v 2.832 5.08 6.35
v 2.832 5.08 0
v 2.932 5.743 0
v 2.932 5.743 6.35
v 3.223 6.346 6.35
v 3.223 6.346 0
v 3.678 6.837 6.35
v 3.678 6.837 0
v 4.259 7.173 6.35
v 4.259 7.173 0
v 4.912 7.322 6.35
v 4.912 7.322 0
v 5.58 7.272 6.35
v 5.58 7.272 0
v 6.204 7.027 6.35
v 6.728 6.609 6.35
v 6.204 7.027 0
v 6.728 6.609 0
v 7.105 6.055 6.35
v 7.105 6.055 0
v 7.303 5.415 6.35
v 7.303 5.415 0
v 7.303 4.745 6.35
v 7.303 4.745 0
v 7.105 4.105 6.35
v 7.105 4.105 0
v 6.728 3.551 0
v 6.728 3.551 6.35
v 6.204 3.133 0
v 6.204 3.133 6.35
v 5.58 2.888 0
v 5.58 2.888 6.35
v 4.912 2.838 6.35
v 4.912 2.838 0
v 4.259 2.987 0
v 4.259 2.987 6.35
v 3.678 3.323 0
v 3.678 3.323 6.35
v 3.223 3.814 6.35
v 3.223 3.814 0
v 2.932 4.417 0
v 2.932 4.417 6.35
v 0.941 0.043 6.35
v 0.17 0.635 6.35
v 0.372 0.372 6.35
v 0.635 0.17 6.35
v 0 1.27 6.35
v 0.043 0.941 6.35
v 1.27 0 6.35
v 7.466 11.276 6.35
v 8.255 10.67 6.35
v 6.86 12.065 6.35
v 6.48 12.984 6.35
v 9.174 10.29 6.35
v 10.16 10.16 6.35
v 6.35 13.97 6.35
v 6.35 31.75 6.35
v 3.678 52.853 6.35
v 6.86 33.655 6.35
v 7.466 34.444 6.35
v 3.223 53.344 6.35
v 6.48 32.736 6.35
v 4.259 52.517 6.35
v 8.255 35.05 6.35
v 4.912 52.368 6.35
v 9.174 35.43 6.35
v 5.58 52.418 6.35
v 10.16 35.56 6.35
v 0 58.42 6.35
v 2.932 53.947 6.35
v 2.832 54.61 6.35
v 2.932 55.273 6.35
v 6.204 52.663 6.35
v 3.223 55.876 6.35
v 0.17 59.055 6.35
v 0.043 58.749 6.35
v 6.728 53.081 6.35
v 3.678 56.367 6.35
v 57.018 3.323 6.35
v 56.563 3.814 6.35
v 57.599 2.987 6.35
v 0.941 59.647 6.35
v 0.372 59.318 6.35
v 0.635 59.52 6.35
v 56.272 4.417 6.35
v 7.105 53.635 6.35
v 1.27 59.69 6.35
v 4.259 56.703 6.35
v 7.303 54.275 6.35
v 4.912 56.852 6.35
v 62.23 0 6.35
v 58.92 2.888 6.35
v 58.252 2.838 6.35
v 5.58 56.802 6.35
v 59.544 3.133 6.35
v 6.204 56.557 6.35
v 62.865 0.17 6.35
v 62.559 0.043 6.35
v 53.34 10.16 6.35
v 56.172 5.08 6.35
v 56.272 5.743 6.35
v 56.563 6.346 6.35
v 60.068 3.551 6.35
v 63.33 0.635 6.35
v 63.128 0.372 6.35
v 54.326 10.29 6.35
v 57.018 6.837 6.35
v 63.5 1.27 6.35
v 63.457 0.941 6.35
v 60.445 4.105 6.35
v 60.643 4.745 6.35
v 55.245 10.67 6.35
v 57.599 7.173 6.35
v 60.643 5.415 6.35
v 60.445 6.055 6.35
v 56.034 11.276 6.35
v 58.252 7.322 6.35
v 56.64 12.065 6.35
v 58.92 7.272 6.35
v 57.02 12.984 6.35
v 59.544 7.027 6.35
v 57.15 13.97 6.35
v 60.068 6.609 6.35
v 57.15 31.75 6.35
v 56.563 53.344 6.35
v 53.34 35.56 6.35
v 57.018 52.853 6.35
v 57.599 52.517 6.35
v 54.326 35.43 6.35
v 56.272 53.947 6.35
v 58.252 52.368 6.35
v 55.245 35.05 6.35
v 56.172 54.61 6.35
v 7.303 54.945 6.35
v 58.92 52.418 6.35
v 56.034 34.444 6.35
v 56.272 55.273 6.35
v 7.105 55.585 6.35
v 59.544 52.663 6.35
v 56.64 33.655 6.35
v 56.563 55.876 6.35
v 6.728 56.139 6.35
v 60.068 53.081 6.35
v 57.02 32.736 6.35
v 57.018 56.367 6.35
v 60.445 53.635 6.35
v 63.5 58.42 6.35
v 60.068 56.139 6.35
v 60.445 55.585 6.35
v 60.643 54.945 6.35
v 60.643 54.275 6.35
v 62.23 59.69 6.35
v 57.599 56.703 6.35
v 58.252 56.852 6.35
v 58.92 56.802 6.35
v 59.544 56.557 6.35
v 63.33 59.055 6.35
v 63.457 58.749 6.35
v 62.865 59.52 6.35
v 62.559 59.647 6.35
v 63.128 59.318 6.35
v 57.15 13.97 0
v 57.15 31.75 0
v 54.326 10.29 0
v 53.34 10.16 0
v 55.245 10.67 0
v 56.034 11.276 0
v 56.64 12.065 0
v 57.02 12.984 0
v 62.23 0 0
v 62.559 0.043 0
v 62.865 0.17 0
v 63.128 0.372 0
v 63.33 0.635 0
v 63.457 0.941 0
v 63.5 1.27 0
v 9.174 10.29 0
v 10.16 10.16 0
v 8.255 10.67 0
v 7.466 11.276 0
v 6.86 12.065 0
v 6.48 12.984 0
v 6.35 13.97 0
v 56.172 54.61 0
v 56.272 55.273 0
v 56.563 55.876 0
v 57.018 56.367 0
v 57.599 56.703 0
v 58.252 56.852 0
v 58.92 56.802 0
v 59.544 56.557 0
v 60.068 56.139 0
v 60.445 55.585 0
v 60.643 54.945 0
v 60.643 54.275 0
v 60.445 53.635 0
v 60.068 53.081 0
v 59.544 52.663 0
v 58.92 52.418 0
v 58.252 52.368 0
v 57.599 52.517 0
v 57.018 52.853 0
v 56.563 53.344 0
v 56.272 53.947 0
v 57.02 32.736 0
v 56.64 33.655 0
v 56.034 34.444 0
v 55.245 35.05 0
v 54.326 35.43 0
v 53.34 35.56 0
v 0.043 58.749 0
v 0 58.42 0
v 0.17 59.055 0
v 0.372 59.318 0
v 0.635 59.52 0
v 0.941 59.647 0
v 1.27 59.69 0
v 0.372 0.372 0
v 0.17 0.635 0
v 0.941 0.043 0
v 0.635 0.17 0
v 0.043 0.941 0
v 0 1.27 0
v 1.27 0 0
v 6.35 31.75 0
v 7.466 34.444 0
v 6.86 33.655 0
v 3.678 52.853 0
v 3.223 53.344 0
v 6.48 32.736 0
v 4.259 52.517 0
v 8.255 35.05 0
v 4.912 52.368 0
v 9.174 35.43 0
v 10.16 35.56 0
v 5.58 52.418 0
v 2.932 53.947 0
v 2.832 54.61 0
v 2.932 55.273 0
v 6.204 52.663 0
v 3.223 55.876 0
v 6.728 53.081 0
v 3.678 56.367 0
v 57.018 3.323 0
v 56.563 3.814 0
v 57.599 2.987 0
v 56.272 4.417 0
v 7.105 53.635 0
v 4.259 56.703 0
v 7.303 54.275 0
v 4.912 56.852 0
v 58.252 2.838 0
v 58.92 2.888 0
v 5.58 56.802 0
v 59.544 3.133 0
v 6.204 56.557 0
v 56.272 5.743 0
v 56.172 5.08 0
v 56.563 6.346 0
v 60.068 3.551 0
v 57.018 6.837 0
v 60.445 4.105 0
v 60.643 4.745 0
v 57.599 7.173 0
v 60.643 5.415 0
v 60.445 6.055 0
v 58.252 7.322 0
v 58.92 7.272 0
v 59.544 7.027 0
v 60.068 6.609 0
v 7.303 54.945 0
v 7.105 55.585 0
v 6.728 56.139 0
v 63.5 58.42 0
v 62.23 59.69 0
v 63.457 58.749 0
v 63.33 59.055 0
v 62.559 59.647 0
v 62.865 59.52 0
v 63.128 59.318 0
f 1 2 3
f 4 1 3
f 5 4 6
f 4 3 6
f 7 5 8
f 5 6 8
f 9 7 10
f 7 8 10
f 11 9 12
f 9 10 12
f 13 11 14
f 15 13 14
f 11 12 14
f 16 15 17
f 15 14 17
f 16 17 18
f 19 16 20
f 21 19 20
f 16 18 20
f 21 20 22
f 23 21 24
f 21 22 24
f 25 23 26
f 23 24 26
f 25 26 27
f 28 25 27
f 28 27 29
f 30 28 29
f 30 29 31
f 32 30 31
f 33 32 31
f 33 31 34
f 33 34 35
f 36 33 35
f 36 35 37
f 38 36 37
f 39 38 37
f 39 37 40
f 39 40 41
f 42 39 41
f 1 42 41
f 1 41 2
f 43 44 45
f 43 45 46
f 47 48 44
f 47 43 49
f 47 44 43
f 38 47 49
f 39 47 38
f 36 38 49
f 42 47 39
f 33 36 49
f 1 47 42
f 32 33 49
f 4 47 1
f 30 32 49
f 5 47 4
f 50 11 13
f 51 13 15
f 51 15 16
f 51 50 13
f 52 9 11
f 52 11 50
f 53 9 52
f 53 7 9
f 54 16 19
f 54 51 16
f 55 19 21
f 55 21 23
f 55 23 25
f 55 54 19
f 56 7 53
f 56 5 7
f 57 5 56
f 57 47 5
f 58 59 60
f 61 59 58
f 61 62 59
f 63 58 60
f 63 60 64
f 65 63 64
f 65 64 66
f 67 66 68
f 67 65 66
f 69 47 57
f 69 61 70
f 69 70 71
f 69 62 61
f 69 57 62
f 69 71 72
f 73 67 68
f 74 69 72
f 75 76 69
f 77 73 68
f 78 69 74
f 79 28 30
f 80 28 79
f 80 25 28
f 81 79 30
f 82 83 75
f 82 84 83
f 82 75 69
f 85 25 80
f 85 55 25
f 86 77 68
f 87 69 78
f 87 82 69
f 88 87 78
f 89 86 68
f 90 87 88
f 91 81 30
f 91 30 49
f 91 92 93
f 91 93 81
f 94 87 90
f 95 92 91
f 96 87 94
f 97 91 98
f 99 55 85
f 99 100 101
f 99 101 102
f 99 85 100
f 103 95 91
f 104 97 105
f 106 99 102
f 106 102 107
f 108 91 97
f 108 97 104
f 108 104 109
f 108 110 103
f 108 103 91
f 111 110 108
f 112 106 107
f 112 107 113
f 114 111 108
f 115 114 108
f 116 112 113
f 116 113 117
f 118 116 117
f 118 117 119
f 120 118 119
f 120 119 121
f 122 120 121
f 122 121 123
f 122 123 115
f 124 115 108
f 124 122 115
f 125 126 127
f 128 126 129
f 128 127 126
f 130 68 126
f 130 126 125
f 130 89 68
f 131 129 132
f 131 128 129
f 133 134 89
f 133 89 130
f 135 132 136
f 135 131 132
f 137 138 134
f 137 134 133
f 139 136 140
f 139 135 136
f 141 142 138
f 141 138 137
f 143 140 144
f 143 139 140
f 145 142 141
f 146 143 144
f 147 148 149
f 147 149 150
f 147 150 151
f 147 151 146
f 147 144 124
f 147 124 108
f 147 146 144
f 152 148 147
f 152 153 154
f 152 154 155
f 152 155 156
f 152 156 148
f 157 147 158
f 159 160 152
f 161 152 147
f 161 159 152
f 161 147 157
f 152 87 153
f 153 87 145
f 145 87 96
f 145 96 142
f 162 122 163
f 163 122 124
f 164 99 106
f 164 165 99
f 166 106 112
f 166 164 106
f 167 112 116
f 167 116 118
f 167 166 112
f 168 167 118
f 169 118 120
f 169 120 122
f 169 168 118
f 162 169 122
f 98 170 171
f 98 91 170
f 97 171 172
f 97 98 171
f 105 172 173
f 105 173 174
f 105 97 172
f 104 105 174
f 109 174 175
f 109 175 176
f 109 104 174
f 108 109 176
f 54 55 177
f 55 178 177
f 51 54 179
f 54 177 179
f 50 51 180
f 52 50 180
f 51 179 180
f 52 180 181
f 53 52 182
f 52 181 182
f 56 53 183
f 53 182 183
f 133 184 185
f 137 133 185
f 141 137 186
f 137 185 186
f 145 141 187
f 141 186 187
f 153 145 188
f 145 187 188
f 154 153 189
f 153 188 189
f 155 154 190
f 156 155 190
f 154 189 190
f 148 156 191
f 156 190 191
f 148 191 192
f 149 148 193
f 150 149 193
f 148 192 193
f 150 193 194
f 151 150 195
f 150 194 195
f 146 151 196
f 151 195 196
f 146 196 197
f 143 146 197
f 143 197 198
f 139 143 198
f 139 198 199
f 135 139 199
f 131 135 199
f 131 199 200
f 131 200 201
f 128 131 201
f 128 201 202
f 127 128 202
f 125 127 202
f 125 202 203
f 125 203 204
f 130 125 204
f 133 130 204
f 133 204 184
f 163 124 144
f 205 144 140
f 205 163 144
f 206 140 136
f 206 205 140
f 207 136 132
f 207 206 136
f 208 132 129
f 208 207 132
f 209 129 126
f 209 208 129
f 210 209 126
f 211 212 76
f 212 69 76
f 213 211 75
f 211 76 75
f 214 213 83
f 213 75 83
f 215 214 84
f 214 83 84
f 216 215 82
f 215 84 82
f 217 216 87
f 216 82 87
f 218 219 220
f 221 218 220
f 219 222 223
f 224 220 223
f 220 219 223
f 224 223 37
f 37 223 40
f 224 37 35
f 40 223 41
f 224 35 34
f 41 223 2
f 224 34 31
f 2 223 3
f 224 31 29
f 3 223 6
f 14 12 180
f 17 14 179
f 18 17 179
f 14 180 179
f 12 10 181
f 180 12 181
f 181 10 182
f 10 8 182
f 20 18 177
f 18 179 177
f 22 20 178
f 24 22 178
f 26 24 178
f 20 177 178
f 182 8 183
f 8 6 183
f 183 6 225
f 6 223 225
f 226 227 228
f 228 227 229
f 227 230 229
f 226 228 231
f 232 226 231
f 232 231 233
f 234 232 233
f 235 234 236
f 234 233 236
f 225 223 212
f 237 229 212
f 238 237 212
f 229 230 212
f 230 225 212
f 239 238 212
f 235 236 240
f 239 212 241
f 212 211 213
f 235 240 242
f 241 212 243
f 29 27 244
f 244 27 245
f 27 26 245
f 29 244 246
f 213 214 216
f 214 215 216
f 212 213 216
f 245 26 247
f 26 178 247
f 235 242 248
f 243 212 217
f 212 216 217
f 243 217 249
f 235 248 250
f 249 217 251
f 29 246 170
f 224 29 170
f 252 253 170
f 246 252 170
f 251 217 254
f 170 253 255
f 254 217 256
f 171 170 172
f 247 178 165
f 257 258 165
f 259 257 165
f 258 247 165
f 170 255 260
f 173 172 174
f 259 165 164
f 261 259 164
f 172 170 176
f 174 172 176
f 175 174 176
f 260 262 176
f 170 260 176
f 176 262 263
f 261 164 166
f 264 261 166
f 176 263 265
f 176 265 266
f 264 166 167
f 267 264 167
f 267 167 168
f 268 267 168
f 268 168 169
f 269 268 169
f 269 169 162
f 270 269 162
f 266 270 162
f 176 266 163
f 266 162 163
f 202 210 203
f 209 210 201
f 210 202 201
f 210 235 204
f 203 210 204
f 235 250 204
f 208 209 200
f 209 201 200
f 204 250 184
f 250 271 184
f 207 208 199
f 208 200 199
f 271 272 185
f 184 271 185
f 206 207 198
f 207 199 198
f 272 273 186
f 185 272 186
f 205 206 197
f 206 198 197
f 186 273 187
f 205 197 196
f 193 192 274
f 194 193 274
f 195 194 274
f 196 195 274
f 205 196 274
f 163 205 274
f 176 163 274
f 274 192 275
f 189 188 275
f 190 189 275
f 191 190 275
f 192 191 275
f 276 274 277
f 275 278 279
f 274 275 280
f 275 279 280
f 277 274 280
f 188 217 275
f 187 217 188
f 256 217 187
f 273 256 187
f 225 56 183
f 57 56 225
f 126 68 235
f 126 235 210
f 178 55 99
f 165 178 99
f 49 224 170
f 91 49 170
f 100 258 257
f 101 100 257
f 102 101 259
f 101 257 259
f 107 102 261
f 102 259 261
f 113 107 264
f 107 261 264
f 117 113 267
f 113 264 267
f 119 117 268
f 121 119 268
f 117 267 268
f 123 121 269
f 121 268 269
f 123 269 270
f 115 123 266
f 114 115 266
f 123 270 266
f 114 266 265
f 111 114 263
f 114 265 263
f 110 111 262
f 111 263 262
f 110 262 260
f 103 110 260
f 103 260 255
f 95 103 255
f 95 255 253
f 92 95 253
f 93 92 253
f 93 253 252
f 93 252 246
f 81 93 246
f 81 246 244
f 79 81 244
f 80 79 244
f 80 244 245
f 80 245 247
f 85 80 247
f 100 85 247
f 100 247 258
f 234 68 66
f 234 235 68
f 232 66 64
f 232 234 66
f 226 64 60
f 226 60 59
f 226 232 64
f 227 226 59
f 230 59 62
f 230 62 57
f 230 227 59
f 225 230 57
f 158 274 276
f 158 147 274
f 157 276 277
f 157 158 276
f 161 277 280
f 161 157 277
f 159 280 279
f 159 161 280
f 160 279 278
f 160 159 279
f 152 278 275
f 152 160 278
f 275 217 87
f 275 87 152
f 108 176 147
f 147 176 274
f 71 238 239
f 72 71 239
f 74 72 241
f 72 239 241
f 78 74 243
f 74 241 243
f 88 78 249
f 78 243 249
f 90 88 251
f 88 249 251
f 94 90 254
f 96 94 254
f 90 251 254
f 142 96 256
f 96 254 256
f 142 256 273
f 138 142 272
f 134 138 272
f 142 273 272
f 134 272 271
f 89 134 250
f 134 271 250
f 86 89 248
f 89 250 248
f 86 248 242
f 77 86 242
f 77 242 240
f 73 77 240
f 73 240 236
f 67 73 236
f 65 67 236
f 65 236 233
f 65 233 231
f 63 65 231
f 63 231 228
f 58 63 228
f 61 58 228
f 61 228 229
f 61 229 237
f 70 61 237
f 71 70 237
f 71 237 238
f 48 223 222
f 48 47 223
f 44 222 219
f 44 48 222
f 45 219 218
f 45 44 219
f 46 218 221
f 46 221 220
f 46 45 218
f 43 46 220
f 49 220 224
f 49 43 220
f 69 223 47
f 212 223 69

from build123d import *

# Parameters (mm, degrees)
SKETCH1_W             = 63.5
SKETCH1_H             = 59.69
BOSS_EXTRUDE1_DEPTH   = 6.35
FILLET1_R             = 1.27
F_8_CLEARANCE_HOLE1_D = 4.4958
SKETCH7_W             = 50.8
SKETCH7_H             = 25.4
CUT_EXTRUDE1_DEPTH    = 7.35
FILLET2_R             = 3.81


with BuildPart() as part:
    # Sketch1 → Boss-Extrude1 (new body)
    with BuildSketch(Plane.XY):
        with Locations((31.75, 29.845)):
            Rectangle(SKETCH1_W, SKETCH1_H)
    extrude(amount=BOSS_EXTRUDE1_DEPTH)

    # Fillet1
    fillet1_edges = [part.edges().sort_by_distance(p)[0] for p in [
        (0, 59.69, 3.175),
        (63.5, 59.69, 3.175),
        (63.5, 0, 3.175),
        (0, 0, 3.175),
    ]]
    fillet(fillet1_edges, radius=FILLET1_R)

    # #8 Clearance Hole1 (through all)
    with Locations(Plane.XY.offset(6.35)):
        with Locations((5.08, 54.61), (58.42, 54.61), (58.42, 5.08), (5.08, 5.08)):
            Hole(F_8_CLEARANCE_HOLE1_D / 2)

    # Sketch7 → Cut-Extrude1 (cut, through all)
    with BuildSketch(Plane.XY.offset(6.35)):
        with Locations((31.75, 22.86)):
            Rectangle(SKETCH7_W, SKETCH7_H)
    extrude(amount=-CUT_EXTRUDE1_DEPTH, mode=Mode.SUBTRACT)

    # Fillet2
    fillet2_edges = [part.edges().sort_by_distance(p)[0] for p in [
        (6.35, 10.16, 3.175),
        (6.35, 35.56, 3.175),
        (57.15, 35.56, 3.175),
        (57.15, 10.16, 3.175),
    ]]
    fillet(fillet2_edges, radius=FILLET2_R)


solid = part.part
